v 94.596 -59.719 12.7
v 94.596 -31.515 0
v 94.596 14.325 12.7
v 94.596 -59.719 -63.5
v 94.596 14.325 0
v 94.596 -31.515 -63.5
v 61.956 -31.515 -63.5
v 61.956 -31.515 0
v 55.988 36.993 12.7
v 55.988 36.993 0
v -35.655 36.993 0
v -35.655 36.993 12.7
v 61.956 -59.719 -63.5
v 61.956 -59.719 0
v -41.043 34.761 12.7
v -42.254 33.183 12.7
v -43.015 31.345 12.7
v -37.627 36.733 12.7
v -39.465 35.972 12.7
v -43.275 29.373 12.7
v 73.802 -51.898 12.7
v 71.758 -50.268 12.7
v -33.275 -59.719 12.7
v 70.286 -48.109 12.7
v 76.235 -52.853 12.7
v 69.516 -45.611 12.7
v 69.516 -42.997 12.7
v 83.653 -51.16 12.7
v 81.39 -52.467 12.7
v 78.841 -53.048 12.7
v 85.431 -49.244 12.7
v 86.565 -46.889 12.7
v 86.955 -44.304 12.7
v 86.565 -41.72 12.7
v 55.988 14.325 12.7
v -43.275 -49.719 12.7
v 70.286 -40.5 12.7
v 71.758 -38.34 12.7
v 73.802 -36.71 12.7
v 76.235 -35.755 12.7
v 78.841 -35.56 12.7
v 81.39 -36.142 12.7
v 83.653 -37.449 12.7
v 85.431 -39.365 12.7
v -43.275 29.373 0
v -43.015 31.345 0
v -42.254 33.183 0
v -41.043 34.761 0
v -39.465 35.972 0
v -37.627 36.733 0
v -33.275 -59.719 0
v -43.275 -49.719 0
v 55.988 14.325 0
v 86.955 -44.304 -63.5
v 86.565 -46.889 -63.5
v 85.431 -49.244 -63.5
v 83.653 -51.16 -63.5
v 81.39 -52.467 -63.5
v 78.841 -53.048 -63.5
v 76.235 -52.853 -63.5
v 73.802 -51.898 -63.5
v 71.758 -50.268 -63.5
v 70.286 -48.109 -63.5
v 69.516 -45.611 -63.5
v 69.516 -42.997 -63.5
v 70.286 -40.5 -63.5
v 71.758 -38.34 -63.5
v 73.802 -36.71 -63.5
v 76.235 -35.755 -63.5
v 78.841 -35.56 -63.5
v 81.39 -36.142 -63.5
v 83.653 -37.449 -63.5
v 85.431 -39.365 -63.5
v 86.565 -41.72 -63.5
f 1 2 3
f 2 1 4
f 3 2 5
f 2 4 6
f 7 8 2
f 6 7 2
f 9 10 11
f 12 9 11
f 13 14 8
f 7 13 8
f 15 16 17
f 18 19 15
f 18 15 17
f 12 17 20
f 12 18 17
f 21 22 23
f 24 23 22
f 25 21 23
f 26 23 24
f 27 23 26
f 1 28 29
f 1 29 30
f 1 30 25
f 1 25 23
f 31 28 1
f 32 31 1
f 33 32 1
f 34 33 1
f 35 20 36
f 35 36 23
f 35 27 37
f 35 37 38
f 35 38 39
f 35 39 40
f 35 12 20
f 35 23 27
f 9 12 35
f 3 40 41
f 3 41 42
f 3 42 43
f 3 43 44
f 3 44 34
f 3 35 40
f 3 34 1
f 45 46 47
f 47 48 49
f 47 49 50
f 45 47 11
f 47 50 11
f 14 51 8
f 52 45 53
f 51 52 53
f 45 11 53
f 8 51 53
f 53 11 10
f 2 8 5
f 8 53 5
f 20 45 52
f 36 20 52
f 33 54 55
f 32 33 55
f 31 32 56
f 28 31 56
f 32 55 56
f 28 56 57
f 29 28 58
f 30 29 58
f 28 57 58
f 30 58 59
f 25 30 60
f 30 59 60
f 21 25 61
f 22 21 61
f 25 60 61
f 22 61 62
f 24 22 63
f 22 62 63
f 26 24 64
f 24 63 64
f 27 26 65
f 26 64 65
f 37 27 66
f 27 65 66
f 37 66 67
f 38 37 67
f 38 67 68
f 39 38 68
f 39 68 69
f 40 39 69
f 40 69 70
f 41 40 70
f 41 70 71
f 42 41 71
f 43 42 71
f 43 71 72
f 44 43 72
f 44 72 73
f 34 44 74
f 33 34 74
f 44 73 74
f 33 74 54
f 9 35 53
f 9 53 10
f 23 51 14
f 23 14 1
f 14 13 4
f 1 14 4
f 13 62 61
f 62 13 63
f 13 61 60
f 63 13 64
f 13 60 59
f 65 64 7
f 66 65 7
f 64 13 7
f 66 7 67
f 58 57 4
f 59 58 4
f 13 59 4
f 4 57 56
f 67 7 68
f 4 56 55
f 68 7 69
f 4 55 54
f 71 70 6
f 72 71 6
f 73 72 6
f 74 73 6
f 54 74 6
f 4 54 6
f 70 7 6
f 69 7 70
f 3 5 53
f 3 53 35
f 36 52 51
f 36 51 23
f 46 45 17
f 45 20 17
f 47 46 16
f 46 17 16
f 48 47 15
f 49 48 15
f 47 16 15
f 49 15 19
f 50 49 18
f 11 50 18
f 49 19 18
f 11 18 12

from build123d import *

# Parameters (mm, degrees)
F1_DEPTH = 12.7
F2_W     = 32.6402336359
F2_H     = 28.2041579485
F3_DEPTH = 76.2
F4_W     = 22.6674545556
F4_H     = 12.7
F5_DEPTH = 38.608
F6_R     = 8.7685690735
F7_DEPTH = 76.2
F8_R     = 7.62
F9_SIZE  = 10


with BuildPart() as f1:
    # F0 (on Top) → F1 (new body)
    with BuildSketch(Plane.XY):
        Polygon((94.5960357785, 36.9925387204), (-43.2745479047, 36.9925387204), (-43.2745479047, -59.7194693983), (58.4955252707, -59.7194693983), (69.8579475284, -59.7194693983), (94.5960357785, -59.7194693983), (94.5960357785, -27.4753328413), (94.5960357785, -27.073610574), align=None)
    extrude(amount=F1_DEPTH)

    # F2 (on face) → F3 (join)
    with BuildSketch(Plane.XY.offset(12.7)):
        with Locations((78.2759189606, -45.617390424)):
            Rectangle(F2_W, F2_H)
    extrude(amount=-F3_DEPTH)

    # F4 (on face) → F5 (cut)
    with BuildSketch(Plane.YZ.offset(94.5960357785)):
        with Locations((25.6588114426, 6.35)):
            Rectangle(F4_W, F4_H)
    extrude(amount=-F5_DEPTH, mode=Mode.SUBTRACT)

    # F6 (on face) → F7 (cut)
    with BuildSketch(Plane(origin=(0, 0, -63.5), x_dir=(1, 0, 0), z_dir=(0, 0, -1))):
        with Locations((78.1861692667, 44.3040877581)):
            Circle(F6_R)
    extrude(amount=-F7_DEPTH, mode=Mode.SUBTRACT)

    # F8
    f8_edges = [f1.edges().sort_by_distance(p)[0] for p in [
        (-43.274548, 36.992539, 6.35),
    ]]
    fillet(f8_edges, radius=F8_R)

    # F9
    f9_edges = [f1.edges().sort_by_distance(p)[0] for p in [
        (-43.274548, -59.719469, 6.35),
    ]]
    chamfer(f9_edges, length=F9_SIZE)


solid = f1.part
